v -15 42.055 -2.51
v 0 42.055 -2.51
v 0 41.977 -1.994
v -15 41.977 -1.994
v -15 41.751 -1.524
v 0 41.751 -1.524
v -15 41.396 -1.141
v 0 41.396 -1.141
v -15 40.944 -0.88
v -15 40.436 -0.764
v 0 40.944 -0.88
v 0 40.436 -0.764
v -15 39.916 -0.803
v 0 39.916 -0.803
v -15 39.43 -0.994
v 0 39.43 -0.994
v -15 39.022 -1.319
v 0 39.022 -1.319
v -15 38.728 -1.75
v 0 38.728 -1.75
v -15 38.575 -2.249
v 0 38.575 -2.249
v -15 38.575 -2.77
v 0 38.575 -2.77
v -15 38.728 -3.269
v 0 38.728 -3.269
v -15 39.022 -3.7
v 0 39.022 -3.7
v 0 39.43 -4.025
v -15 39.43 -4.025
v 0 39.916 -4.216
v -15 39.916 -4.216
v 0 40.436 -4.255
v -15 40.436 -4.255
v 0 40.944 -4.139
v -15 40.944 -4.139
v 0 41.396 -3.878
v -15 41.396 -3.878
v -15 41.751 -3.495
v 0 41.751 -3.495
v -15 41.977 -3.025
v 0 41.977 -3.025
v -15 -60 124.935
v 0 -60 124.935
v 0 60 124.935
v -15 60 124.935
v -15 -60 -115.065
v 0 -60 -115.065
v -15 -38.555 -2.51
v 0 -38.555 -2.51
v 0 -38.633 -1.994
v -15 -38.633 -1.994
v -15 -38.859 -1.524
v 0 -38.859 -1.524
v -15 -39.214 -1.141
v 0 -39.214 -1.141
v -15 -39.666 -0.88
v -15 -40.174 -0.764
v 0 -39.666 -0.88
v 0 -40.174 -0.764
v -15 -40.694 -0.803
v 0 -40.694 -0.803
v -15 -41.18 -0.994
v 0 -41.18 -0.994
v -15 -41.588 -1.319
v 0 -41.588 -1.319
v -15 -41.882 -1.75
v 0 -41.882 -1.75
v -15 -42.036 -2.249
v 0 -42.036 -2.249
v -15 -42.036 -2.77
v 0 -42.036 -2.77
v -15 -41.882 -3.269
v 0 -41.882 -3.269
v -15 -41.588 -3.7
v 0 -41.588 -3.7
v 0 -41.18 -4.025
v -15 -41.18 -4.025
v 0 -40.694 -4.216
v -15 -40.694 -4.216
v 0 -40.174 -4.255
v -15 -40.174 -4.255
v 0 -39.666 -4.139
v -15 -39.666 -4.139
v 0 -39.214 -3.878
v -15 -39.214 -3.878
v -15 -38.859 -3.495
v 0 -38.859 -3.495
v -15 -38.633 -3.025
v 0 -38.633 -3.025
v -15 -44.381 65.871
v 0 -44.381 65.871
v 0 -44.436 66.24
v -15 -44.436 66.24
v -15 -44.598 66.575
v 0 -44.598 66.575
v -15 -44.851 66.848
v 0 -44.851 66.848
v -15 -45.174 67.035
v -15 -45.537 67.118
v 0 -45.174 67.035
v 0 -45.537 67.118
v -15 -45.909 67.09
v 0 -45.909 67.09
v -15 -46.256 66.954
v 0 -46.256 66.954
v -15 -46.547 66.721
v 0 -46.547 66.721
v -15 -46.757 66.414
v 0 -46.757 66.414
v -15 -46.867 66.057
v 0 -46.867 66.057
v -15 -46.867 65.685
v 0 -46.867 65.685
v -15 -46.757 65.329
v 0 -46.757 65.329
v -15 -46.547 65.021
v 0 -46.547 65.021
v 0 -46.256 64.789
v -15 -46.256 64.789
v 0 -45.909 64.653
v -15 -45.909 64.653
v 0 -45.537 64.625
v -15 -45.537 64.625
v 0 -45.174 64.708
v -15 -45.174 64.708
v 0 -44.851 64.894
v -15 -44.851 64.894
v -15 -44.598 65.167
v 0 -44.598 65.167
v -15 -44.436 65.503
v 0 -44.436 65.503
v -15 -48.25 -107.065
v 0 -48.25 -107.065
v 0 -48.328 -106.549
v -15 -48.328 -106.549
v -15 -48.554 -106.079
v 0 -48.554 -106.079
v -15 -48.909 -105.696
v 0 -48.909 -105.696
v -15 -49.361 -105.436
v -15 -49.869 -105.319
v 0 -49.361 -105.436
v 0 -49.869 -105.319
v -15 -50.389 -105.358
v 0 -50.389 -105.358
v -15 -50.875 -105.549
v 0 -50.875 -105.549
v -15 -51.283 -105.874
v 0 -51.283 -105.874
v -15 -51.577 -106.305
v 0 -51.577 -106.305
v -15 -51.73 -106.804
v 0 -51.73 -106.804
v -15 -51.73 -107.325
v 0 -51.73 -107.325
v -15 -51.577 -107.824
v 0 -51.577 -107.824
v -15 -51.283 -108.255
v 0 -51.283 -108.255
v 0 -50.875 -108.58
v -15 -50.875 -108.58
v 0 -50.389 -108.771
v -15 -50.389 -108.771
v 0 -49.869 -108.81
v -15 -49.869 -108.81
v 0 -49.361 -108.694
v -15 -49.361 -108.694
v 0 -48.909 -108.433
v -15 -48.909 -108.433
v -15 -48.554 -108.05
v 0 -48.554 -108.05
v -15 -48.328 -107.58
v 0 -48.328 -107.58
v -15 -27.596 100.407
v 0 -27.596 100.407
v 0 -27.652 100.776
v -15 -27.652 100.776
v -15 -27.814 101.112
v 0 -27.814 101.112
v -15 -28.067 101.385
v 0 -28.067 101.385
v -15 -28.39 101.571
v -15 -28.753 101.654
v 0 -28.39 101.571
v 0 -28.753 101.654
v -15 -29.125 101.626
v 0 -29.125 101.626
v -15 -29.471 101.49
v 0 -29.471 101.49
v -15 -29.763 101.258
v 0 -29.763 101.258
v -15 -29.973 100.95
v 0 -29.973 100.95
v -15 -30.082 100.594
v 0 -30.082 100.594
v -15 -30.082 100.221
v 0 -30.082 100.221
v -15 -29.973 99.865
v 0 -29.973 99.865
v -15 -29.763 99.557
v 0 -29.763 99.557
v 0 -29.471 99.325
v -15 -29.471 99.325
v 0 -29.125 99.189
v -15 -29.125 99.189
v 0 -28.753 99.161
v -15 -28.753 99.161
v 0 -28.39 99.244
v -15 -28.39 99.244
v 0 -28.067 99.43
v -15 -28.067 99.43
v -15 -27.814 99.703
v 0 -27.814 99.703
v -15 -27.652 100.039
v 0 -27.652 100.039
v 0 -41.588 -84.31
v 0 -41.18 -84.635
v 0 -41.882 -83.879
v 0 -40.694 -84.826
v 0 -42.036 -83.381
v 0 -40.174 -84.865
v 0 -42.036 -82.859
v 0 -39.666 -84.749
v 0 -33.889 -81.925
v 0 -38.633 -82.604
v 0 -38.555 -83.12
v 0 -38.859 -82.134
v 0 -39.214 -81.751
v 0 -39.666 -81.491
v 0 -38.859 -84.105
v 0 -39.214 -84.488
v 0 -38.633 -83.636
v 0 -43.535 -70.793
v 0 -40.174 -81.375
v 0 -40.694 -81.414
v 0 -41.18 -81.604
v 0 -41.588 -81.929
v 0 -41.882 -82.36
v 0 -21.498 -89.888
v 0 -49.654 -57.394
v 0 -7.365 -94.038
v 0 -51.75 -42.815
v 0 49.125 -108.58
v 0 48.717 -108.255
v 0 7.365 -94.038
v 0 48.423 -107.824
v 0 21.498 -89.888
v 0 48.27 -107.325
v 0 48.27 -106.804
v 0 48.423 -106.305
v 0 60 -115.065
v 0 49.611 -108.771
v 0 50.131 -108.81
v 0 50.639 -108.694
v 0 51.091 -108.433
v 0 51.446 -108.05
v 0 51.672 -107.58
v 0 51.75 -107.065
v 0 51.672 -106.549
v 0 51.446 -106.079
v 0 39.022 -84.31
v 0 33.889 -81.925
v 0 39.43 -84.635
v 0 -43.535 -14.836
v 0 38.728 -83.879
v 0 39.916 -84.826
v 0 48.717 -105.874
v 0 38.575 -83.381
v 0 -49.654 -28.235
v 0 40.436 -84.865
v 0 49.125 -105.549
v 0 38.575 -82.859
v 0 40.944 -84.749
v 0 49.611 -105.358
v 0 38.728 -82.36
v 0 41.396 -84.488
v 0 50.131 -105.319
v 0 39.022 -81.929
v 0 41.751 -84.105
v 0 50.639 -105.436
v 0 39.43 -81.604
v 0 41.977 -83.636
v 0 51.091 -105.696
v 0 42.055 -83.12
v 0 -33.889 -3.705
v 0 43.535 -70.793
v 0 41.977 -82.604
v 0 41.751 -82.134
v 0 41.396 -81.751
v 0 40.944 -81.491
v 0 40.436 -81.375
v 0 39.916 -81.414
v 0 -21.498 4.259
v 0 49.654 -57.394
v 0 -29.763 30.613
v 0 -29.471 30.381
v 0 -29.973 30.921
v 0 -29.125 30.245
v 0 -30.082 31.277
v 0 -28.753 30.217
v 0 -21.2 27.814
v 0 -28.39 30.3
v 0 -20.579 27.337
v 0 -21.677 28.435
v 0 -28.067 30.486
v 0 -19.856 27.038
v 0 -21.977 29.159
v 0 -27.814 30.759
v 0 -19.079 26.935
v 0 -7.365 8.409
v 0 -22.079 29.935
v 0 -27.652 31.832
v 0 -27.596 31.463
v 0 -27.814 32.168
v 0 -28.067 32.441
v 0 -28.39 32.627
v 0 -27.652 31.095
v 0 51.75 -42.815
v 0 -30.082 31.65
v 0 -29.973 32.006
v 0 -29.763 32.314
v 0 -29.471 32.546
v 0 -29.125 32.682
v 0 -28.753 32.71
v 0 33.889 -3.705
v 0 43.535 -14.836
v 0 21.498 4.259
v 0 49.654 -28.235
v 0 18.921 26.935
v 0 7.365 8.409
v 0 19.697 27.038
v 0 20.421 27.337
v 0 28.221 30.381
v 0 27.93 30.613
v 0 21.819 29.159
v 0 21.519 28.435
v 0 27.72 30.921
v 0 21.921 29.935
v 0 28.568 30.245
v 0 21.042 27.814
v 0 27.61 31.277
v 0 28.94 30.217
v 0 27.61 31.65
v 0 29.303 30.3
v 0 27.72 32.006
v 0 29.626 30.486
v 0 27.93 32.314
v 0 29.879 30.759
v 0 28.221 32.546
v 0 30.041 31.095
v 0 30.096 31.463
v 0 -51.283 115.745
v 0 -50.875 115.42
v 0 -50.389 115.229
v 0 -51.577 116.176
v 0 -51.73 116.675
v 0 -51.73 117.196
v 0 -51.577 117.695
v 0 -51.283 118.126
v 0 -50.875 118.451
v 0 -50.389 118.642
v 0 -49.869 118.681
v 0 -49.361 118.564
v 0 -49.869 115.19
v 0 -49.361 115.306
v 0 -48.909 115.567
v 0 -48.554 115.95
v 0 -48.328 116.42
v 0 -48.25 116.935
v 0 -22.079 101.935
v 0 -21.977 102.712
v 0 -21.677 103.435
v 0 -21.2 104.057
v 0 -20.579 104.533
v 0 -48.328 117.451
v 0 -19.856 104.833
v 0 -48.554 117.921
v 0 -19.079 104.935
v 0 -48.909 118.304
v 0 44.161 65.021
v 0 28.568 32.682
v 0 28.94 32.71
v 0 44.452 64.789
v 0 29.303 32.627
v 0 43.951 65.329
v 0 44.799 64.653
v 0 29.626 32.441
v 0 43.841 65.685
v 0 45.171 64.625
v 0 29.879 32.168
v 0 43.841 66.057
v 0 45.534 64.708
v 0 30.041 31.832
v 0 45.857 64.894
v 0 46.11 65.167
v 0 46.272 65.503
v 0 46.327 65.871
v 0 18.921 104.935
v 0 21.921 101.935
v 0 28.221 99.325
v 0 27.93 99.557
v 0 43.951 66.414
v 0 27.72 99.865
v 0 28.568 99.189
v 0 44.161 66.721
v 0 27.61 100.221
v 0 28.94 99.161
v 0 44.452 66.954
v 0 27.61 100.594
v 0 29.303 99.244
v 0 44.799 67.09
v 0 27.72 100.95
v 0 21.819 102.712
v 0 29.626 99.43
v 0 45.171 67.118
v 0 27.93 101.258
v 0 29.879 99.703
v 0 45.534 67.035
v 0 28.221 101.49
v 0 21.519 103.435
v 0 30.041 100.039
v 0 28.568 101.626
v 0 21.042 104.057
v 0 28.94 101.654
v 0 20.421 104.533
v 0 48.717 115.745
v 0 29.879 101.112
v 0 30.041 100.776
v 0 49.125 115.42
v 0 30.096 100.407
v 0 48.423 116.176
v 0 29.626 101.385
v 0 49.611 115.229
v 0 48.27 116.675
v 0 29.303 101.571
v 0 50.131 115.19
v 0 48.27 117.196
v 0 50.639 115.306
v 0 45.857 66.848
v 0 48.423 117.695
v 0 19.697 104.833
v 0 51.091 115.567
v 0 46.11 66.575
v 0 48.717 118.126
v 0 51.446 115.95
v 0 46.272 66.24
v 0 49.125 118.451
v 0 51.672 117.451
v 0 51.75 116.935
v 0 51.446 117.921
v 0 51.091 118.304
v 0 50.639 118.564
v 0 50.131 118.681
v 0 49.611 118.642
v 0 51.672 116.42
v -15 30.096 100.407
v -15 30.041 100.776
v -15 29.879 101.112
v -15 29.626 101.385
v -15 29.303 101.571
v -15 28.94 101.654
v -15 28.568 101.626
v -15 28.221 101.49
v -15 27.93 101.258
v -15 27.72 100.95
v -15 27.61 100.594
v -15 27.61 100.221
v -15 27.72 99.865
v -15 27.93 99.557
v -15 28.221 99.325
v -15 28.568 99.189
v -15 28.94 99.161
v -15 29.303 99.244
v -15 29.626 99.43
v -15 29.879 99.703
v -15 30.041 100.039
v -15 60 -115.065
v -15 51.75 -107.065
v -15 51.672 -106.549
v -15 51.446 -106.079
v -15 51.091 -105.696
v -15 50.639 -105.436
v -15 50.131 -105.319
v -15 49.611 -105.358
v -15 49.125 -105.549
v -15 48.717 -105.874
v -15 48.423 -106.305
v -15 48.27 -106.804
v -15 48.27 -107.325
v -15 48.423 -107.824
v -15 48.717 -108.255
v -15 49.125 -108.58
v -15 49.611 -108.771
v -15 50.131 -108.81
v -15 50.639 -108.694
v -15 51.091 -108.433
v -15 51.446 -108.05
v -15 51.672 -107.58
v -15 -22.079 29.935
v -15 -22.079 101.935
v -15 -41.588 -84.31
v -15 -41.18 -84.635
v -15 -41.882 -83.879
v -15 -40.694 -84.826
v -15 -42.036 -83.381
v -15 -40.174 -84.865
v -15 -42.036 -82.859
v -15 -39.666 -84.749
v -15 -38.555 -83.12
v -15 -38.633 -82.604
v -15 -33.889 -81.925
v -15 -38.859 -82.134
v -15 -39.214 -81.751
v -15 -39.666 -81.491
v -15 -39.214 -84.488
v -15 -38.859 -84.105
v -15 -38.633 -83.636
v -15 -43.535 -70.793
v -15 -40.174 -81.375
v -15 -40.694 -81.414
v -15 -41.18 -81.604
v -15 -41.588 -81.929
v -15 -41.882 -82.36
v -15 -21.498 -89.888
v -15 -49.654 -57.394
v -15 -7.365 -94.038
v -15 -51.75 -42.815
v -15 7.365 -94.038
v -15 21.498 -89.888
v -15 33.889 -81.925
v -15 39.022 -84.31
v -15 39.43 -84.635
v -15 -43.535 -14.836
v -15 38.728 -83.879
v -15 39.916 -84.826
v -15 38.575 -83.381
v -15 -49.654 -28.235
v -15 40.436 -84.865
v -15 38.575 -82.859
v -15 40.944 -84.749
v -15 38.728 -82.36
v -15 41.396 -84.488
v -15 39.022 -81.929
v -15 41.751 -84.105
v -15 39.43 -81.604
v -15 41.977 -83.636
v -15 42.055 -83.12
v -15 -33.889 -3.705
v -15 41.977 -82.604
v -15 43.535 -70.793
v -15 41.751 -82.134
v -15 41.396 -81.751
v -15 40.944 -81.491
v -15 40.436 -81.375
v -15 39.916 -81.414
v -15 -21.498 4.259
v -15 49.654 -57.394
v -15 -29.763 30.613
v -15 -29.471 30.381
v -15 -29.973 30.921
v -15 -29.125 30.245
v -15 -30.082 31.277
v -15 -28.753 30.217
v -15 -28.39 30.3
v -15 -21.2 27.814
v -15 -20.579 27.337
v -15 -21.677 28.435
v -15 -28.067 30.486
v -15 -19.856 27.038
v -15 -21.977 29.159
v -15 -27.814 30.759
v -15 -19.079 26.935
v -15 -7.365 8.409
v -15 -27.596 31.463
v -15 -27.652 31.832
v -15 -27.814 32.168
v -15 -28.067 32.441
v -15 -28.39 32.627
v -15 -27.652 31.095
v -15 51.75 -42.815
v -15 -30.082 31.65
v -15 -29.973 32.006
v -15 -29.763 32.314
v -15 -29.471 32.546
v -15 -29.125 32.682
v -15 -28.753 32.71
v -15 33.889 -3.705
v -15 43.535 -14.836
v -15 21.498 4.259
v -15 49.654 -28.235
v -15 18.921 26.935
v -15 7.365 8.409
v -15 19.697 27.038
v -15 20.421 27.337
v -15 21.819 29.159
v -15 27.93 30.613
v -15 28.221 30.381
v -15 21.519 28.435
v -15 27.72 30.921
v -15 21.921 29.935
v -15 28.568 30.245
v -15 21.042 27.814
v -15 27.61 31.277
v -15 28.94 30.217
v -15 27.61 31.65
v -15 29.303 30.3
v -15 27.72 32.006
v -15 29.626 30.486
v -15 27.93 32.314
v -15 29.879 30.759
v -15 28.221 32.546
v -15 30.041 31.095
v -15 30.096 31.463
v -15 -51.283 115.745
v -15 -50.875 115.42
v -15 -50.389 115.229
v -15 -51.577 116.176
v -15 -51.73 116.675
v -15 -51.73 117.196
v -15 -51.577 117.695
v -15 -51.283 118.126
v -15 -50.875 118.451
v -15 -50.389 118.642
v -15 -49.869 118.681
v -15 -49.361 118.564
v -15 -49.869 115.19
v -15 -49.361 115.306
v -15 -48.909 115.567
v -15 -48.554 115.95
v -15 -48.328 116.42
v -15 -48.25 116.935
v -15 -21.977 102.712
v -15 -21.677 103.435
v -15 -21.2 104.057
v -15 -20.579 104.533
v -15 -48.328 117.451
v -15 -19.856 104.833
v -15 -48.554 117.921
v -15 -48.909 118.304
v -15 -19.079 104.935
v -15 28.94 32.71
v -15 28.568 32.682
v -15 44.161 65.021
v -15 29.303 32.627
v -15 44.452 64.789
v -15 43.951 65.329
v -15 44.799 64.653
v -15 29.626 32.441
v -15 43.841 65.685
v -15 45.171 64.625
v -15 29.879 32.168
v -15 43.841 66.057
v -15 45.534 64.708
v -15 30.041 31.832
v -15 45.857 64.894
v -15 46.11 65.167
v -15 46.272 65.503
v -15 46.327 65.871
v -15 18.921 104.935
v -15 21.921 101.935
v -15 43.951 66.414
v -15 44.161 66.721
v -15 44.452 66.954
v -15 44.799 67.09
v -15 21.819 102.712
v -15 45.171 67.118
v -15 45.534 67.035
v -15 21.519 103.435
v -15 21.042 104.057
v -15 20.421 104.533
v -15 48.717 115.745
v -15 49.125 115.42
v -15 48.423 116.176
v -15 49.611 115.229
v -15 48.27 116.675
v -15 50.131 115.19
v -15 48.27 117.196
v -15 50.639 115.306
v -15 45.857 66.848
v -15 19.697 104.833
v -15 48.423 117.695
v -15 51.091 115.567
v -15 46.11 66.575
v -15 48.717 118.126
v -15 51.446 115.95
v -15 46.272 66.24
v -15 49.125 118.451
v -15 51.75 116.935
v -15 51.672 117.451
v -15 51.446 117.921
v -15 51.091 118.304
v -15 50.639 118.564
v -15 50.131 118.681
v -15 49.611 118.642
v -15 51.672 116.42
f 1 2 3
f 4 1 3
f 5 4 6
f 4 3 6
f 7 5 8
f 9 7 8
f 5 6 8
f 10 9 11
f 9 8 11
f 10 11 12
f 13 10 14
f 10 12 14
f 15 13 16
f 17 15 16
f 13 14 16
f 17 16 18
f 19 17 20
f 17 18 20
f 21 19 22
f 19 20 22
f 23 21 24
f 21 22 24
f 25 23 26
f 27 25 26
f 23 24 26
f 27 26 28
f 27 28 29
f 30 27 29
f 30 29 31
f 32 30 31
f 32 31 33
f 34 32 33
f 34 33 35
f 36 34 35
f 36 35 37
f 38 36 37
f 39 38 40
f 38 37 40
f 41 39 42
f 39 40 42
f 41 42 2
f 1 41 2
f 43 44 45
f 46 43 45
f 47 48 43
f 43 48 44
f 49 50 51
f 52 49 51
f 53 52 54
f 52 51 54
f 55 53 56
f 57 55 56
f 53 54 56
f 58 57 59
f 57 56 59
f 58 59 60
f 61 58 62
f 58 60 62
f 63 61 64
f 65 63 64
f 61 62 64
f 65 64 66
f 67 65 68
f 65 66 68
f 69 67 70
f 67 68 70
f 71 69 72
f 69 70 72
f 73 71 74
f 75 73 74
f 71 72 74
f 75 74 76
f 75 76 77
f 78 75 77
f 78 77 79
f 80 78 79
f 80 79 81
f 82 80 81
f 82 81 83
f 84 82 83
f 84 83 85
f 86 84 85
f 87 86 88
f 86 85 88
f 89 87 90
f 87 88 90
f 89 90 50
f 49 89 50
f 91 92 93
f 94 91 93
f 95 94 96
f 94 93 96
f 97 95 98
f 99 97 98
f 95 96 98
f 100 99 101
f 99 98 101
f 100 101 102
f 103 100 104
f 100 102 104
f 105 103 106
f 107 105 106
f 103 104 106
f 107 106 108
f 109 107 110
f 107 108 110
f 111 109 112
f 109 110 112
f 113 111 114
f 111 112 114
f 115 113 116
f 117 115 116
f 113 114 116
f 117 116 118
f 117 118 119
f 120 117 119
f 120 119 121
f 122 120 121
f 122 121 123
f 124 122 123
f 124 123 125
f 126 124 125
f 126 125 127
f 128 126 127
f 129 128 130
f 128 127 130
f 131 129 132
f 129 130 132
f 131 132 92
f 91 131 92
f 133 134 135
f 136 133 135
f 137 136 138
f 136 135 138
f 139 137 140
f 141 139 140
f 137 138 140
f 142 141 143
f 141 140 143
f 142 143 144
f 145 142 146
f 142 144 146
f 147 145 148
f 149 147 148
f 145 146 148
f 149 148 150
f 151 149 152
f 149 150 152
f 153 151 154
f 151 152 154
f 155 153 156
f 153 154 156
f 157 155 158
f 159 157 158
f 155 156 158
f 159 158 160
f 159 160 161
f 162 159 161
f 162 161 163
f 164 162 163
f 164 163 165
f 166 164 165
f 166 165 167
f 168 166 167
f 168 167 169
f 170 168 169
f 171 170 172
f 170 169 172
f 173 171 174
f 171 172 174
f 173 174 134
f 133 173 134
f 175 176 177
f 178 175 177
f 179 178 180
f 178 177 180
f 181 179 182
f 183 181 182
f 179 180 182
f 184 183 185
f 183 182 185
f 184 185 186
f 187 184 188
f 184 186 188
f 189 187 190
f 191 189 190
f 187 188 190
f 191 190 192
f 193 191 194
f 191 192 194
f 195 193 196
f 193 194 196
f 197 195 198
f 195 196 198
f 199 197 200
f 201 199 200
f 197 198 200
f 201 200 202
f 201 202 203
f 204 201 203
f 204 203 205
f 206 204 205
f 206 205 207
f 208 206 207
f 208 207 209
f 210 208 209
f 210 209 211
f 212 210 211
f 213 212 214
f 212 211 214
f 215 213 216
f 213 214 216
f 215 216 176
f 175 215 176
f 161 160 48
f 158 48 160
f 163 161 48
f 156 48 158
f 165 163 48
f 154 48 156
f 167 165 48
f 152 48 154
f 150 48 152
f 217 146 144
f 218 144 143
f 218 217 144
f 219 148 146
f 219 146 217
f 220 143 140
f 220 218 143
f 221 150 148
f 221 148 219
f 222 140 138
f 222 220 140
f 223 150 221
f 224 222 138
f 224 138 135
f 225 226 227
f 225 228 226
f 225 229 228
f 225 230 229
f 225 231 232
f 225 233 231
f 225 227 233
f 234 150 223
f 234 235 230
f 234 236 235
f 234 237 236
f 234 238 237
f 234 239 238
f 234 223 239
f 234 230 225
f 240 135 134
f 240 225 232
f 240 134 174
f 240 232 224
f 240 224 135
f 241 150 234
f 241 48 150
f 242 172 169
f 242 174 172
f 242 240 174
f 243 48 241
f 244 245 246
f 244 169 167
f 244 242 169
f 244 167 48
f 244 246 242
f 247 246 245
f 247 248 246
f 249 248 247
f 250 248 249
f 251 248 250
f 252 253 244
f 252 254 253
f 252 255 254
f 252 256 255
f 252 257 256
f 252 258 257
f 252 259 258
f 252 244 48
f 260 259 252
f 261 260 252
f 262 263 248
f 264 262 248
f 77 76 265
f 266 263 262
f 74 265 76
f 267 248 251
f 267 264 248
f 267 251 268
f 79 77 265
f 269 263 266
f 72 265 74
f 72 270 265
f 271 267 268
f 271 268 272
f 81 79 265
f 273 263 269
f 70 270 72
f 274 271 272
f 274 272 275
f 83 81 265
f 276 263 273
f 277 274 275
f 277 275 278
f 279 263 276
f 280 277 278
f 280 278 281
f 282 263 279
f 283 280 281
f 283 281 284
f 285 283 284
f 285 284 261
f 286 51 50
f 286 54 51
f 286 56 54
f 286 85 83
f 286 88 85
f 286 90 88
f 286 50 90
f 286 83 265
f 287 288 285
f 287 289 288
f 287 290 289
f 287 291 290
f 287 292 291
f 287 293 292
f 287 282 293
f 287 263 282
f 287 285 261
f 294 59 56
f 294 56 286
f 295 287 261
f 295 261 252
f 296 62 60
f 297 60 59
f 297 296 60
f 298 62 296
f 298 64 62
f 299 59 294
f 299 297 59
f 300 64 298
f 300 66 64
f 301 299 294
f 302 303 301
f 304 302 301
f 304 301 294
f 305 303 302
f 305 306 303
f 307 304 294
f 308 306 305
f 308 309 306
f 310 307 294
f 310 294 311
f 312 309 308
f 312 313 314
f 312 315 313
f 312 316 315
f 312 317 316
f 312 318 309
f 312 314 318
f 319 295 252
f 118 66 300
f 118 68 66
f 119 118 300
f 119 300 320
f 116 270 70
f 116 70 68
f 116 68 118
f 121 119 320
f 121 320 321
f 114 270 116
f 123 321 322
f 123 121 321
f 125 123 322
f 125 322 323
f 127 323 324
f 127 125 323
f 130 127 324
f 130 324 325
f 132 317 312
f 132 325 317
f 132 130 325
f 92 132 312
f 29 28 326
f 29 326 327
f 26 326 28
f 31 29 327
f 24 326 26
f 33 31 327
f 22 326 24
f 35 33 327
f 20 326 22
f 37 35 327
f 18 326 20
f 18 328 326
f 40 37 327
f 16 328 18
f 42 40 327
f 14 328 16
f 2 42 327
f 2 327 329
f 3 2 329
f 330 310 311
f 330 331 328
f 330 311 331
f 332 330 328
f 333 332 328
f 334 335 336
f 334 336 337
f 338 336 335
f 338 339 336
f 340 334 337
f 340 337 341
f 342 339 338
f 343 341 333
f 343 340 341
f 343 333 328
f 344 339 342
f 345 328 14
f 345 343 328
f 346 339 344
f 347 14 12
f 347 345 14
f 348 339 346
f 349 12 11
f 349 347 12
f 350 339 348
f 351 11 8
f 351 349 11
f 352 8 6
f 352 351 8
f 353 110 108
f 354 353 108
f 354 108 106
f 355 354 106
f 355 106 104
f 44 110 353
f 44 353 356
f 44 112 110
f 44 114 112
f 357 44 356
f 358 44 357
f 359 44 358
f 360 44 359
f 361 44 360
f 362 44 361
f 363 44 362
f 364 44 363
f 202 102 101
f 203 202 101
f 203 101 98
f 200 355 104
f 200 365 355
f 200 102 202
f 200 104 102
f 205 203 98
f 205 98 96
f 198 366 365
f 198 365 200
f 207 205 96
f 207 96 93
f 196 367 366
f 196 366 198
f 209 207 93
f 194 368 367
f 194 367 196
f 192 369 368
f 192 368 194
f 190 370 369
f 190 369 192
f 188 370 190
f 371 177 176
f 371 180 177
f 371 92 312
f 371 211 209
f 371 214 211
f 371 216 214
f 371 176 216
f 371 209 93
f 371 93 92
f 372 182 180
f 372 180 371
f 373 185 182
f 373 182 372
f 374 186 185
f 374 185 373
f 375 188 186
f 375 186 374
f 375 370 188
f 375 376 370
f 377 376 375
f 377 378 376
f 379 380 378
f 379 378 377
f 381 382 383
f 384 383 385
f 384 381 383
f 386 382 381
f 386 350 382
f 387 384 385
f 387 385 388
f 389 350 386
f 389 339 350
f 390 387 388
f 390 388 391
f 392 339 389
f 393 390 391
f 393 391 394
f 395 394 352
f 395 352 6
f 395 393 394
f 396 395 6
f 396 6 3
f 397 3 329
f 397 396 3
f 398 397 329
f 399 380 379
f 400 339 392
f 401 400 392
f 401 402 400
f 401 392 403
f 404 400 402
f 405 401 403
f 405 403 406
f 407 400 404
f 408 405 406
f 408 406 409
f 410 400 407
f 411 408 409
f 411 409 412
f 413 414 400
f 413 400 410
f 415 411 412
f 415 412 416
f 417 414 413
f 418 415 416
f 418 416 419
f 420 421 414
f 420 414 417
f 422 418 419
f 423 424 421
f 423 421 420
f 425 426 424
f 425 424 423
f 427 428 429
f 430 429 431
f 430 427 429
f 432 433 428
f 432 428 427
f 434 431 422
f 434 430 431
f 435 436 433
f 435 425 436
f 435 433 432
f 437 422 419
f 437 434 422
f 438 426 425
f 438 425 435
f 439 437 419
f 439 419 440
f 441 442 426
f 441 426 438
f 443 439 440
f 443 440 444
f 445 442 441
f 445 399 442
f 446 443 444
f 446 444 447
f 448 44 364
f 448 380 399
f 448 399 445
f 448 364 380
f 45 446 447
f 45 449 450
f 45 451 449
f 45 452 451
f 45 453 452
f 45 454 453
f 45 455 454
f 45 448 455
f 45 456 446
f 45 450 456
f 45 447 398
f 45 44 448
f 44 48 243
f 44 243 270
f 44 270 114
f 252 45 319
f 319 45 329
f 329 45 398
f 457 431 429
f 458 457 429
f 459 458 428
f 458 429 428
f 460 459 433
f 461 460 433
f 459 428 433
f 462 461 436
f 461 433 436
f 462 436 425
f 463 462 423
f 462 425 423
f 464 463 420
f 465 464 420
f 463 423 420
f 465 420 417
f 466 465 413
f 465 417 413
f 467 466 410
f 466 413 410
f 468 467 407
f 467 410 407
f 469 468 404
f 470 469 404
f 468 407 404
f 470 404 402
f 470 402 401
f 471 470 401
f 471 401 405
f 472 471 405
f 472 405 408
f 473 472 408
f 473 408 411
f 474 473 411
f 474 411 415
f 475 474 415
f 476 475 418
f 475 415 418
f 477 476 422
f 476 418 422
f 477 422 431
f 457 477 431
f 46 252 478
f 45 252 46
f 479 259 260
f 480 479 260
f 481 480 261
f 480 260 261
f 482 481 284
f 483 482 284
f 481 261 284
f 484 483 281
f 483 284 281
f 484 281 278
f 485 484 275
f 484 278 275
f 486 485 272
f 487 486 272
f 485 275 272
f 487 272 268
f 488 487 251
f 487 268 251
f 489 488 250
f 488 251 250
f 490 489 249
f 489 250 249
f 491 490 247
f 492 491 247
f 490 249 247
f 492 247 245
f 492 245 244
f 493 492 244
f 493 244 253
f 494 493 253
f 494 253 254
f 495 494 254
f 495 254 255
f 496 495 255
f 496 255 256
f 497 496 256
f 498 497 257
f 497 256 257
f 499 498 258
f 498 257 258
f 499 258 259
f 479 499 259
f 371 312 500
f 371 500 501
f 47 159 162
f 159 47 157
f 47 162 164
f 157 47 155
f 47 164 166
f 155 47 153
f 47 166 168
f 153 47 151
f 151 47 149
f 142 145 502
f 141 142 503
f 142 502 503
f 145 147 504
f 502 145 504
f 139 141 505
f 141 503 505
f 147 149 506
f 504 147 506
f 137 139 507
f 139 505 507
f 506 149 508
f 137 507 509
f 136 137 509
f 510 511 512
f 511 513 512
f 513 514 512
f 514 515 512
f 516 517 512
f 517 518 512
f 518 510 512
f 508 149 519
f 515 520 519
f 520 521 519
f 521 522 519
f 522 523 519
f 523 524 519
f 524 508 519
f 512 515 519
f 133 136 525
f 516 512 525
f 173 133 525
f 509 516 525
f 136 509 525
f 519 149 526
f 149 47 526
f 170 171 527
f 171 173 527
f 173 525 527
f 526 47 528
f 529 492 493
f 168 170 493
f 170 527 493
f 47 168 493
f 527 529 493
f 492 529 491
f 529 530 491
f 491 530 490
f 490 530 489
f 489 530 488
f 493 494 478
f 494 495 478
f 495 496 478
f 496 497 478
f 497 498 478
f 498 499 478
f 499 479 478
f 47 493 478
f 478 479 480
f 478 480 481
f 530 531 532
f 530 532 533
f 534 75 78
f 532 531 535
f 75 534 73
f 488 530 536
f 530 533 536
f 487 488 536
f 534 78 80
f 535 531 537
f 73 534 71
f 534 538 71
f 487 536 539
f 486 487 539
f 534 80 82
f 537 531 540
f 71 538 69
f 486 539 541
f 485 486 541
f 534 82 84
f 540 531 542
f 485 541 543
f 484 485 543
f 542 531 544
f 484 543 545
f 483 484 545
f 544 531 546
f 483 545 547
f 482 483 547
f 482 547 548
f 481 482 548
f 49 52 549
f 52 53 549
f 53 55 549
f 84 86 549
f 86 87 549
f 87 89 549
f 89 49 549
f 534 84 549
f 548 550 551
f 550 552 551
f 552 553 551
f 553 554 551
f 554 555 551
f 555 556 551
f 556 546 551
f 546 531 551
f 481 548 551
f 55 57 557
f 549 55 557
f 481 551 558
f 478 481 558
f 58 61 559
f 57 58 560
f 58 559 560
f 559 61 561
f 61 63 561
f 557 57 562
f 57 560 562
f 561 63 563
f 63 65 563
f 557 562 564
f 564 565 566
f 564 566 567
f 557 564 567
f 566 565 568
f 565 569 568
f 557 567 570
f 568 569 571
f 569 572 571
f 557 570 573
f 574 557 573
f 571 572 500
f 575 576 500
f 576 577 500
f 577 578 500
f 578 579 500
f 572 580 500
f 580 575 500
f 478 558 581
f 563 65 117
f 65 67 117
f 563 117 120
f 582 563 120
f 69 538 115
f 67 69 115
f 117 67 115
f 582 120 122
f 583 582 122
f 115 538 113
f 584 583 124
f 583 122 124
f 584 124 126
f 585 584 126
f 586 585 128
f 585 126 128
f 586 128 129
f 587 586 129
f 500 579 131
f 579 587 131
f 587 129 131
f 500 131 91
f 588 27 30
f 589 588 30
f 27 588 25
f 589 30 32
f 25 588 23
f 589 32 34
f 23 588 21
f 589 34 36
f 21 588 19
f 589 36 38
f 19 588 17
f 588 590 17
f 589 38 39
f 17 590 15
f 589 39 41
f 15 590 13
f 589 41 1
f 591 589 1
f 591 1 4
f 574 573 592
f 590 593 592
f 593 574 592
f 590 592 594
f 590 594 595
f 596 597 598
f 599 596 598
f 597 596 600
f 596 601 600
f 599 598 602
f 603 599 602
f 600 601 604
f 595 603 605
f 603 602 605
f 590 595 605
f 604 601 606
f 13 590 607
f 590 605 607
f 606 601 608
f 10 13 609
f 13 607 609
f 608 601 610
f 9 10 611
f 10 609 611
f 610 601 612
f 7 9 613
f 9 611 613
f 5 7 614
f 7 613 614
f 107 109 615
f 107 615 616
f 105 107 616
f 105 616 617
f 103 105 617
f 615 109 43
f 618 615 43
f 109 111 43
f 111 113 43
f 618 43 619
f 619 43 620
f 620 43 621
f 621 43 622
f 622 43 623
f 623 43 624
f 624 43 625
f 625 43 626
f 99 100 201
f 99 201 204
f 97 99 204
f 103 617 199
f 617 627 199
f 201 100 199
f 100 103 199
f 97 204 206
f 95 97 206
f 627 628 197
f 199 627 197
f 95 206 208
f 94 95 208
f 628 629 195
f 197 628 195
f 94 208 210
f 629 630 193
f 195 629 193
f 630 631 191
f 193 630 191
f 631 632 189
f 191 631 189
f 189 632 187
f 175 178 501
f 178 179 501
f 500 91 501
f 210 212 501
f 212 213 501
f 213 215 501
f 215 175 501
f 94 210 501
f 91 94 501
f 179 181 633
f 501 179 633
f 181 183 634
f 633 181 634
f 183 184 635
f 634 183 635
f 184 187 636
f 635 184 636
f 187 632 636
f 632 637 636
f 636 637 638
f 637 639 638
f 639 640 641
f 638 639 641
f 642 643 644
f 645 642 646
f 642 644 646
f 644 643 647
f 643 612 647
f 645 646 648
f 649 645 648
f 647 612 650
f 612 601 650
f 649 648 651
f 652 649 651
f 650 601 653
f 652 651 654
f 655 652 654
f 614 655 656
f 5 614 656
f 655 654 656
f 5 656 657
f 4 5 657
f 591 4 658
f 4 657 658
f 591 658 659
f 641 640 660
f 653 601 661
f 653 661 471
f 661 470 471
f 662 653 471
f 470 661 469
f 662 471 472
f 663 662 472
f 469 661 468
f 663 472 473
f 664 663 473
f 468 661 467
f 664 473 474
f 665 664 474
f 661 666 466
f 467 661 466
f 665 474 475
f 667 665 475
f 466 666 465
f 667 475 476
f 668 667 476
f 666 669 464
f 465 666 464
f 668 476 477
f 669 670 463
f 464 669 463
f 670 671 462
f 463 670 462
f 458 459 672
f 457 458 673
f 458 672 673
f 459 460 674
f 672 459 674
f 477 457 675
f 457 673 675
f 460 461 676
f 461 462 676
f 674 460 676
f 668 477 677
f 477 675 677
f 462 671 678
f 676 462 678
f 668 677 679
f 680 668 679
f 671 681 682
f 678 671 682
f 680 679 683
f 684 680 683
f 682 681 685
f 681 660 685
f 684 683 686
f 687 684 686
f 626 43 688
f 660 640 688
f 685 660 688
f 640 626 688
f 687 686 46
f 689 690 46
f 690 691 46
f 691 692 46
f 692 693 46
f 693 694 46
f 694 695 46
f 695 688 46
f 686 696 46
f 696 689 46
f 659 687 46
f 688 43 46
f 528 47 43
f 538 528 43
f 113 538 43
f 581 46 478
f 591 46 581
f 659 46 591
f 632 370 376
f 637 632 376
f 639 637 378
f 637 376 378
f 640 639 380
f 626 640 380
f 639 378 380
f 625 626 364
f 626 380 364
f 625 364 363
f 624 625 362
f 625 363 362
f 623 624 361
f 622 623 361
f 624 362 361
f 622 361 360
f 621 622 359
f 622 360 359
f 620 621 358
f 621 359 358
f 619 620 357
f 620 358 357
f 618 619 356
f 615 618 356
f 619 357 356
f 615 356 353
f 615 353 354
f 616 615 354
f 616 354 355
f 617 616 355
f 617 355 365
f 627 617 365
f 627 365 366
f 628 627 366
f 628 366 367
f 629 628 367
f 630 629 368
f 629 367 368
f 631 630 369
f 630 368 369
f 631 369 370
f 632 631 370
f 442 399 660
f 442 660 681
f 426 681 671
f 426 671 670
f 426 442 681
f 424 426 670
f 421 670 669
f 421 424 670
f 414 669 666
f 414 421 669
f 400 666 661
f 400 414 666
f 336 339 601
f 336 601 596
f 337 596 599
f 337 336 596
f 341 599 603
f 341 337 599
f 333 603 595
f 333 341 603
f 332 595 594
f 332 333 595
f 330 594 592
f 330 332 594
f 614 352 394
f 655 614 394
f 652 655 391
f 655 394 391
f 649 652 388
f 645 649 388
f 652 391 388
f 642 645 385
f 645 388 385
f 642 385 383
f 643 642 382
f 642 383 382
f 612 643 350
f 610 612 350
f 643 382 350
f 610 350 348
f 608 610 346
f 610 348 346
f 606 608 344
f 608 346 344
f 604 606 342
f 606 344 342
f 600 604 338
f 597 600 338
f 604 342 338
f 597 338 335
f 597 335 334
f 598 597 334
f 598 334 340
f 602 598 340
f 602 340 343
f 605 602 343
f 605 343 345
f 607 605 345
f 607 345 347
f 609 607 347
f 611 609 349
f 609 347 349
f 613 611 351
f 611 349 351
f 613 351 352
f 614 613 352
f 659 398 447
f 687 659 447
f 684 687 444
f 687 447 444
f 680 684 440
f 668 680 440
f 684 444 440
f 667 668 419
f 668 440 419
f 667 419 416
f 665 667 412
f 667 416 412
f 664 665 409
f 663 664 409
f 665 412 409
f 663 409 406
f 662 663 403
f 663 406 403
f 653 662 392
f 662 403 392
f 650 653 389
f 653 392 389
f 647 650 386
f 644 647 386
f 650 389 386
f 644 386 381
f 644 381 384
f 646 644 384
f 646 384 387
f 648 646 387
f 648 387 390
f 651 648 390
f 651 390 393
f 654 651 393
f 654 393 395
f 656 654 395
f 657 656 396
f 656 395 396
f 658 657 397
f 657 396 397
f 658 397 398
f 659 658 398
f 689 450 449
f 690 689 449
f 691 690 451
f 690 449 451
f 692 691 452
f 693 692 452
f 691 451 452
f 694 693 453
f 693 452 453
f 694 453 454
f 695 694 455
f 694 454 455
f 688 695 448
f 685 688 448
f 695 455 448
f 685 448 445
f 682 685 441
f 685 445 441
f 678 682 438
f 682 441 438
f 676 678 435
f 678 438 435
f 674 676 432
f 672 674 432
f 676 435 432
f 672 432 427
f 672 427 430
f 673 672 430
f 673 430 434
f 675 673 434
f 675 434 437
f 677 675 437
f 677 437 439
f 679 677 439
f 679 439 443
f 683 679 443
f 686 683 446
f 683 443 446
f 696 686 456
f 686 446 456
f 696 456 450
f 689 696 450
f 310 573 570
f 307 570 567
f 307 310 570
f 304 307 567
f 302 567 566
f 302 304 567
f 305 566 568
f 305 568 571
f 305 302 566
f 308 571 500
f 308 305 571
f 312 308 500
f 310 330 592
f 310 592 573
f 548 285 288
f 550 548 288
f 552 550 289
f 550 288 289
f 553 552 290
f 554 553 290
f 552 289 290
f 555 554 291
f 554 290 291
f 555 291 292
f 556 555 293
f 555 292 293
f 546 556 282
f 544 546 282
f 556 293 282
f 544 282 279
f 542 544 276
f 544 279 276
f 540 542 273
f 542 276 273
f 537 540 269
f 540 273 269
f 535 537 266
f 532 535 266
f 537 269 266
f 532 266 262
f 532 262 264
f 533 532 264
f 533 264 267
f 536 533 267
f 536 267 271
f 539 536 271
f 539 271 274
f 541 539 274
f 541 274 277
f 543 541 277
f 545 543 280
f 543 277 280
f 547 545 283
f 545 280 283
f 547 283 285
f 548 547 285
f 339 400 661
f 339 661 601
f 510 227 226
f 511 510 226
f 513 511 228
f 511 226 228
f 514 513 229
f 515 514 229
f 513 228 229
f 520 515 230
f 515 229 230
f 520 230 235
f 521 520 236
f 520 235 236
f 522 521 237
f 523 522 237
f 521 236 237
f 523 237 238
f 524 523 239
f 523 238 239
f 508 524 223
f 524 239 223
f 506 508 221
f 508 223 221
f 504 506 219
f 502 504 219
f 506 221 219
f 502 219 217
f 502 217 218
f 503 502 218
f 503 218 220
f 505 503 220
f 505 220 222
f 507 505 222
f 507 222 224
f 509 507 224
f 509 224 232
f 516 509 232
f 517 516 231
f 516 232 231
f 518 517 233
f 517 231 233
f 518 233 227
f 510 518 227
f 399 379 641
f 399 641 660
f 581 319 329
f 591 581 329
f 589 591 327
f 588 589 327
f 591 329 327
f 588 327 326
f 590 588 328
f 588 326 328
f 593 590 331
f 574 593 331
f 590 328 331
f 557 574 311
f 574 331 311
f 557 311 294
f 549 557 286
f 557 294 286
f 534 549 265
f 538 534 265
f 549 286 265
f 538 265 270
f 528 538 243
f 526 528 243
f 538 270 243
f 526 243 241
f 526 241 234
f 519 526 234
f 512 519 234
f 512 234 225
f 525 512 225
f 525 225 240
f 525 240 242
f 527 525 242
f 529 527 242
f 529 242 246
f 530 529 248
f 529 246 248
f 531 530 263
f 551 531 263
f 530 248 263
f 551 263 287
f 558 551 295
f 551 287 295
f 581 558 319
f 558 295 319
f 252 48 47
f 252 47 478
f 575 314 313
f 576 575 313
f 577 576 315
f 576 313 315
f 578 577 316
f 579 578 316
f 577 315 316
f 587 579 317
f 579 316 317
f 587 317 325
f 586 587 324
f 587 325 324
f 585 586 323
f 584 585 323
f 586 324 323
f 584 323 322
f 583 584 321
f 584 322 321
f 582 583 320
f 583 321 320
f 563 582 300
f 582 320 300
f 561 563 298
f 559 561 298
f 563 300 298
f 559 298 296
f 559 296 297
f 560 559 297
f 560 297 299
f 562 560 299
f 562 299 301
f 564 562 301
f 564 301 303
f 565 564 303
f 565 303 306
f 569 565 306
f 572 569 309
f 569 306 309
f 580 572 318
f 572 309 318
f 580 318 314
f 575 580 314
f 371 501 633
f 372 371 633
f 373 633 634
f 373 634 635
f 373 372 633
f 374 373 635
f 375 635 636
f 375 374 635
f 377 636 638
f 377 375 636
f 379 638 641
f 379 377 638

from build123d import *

# Parameters (mm, degrees)
F0_W     = 120
F0_H     = 240
F0_R     = 1.75
F0_R_2   = 51.75
F0_R_3   = 1.25
F1_DEPTH = 15


# Not quite as in the source:
# - a feature names something its author has since deleted; it is built from what else it names


with BuildPart() as f1:
    # F0 (on Right) → F1 (new body)
    with BuildSketch(Plane.YZ):
        with Locations((0, 4.9354011911)):
            Rectangle(F0_W, F0_H)
        with Locations((-49.9999973178, -107.0645988089)):
            Circle(F0_R, mode=Mode.SUBTRACT)
        with Locations((-40.3050865276, -83.1196853366)):
            Circle(F0_R, mode=Mode.SUBTRACT)
        with Locations((-40.3050865276, -2.5095122813)):
            Circle(F0_R, mode=Mode.SUBTRACT)
        with Locations((50.0000026822, -107.0645988089)):
            Circle(F0_R, mode=Mode.SUBTRACT)
        with Locations((40.3050865276, -83.1196853366)):
            Circle(F0_R, mode=Mode.SUBTRACT)
        with Locations((0, -42.8145988089)):
            Circle(F0_R_2, mode=Mode.SUBTRACT)
        with Locations((40.3050865276, -2.5095122813)):
            Circle(F0_R, mode=Mode.SUBTRACT)
        with Locations((-28.8463527312, 31.4634012507)):
            Circle(F0_R_3, mode=Mode.SUBTRACT)
        with Locations((-45.6305965781, 65.8711940348)):
            Circle(F0_R_3, mode=Mode.SUBTRACT)
        with Locations((-49.9999973178, 116.9354011911)):
            Circle(F0_R, mode=Mode.SUBTRACT)
        with BuildLine():
            ThreePointArc((-22.0790897047, 101.9354011911), (-21.2004100483, 104.0567215346), (-19.0790897047, 104.9354011911))
            Line((-19.0790897047, 104.9354011911), (18.9209102953, 104.9354011911))
            ThreePointArc((18.9209102953, 104.9354011911), (21.0422306388, 104.0567215346), (21.9209102953, 101.9354011911))
            Line((21.9209102953, 101.9354011911), (21.9209102953, 29.9354011911))
            ThreePointArc((21.9209102953, 29.9354011911), (21.0422306388, 27.8140808475), (18.9209102953, 26.9354011911))
            Line((18.9209102953, 26.9354011911), (-19.0790897047, 26.9354011911))
            ThreePointArc((-19.0790897047, 26.9354011911), (-21.2004100483, 27.8140808475), (-22.0790897047, 29.9354011911))
            Line((-22.0790897047, 29.9354011911), (-22.0790897047, 101.9354011911))
        make_face(mode=Mode.SUBTRACT)
        with Locations((-28.8463527312, 100.4074011314)):
            Circle(F0_R_3, mode=Mode.SUBTRACT)
        with Locations((28.8463527312, 31.4634012507)):
            Circle(F0_R_3, mode=Mode.SUBTRACT)
        with Locations((28.8463527312, 100.4074011314)):
            Circle(F0_R_3, mode=Mode.SUBTRACT)
        with Locations((45.0773127377, 65.8711940348)):
            Circle(F0_R_3, mode=Mode.SUBTRACT)
        with Locations((50.0000026822, 116.9354046481)):
            Circle(F0_R, mode=Mode.SUBTRACT)
    extrude(amount=-F1_DEPTH)


solid = f1.part
